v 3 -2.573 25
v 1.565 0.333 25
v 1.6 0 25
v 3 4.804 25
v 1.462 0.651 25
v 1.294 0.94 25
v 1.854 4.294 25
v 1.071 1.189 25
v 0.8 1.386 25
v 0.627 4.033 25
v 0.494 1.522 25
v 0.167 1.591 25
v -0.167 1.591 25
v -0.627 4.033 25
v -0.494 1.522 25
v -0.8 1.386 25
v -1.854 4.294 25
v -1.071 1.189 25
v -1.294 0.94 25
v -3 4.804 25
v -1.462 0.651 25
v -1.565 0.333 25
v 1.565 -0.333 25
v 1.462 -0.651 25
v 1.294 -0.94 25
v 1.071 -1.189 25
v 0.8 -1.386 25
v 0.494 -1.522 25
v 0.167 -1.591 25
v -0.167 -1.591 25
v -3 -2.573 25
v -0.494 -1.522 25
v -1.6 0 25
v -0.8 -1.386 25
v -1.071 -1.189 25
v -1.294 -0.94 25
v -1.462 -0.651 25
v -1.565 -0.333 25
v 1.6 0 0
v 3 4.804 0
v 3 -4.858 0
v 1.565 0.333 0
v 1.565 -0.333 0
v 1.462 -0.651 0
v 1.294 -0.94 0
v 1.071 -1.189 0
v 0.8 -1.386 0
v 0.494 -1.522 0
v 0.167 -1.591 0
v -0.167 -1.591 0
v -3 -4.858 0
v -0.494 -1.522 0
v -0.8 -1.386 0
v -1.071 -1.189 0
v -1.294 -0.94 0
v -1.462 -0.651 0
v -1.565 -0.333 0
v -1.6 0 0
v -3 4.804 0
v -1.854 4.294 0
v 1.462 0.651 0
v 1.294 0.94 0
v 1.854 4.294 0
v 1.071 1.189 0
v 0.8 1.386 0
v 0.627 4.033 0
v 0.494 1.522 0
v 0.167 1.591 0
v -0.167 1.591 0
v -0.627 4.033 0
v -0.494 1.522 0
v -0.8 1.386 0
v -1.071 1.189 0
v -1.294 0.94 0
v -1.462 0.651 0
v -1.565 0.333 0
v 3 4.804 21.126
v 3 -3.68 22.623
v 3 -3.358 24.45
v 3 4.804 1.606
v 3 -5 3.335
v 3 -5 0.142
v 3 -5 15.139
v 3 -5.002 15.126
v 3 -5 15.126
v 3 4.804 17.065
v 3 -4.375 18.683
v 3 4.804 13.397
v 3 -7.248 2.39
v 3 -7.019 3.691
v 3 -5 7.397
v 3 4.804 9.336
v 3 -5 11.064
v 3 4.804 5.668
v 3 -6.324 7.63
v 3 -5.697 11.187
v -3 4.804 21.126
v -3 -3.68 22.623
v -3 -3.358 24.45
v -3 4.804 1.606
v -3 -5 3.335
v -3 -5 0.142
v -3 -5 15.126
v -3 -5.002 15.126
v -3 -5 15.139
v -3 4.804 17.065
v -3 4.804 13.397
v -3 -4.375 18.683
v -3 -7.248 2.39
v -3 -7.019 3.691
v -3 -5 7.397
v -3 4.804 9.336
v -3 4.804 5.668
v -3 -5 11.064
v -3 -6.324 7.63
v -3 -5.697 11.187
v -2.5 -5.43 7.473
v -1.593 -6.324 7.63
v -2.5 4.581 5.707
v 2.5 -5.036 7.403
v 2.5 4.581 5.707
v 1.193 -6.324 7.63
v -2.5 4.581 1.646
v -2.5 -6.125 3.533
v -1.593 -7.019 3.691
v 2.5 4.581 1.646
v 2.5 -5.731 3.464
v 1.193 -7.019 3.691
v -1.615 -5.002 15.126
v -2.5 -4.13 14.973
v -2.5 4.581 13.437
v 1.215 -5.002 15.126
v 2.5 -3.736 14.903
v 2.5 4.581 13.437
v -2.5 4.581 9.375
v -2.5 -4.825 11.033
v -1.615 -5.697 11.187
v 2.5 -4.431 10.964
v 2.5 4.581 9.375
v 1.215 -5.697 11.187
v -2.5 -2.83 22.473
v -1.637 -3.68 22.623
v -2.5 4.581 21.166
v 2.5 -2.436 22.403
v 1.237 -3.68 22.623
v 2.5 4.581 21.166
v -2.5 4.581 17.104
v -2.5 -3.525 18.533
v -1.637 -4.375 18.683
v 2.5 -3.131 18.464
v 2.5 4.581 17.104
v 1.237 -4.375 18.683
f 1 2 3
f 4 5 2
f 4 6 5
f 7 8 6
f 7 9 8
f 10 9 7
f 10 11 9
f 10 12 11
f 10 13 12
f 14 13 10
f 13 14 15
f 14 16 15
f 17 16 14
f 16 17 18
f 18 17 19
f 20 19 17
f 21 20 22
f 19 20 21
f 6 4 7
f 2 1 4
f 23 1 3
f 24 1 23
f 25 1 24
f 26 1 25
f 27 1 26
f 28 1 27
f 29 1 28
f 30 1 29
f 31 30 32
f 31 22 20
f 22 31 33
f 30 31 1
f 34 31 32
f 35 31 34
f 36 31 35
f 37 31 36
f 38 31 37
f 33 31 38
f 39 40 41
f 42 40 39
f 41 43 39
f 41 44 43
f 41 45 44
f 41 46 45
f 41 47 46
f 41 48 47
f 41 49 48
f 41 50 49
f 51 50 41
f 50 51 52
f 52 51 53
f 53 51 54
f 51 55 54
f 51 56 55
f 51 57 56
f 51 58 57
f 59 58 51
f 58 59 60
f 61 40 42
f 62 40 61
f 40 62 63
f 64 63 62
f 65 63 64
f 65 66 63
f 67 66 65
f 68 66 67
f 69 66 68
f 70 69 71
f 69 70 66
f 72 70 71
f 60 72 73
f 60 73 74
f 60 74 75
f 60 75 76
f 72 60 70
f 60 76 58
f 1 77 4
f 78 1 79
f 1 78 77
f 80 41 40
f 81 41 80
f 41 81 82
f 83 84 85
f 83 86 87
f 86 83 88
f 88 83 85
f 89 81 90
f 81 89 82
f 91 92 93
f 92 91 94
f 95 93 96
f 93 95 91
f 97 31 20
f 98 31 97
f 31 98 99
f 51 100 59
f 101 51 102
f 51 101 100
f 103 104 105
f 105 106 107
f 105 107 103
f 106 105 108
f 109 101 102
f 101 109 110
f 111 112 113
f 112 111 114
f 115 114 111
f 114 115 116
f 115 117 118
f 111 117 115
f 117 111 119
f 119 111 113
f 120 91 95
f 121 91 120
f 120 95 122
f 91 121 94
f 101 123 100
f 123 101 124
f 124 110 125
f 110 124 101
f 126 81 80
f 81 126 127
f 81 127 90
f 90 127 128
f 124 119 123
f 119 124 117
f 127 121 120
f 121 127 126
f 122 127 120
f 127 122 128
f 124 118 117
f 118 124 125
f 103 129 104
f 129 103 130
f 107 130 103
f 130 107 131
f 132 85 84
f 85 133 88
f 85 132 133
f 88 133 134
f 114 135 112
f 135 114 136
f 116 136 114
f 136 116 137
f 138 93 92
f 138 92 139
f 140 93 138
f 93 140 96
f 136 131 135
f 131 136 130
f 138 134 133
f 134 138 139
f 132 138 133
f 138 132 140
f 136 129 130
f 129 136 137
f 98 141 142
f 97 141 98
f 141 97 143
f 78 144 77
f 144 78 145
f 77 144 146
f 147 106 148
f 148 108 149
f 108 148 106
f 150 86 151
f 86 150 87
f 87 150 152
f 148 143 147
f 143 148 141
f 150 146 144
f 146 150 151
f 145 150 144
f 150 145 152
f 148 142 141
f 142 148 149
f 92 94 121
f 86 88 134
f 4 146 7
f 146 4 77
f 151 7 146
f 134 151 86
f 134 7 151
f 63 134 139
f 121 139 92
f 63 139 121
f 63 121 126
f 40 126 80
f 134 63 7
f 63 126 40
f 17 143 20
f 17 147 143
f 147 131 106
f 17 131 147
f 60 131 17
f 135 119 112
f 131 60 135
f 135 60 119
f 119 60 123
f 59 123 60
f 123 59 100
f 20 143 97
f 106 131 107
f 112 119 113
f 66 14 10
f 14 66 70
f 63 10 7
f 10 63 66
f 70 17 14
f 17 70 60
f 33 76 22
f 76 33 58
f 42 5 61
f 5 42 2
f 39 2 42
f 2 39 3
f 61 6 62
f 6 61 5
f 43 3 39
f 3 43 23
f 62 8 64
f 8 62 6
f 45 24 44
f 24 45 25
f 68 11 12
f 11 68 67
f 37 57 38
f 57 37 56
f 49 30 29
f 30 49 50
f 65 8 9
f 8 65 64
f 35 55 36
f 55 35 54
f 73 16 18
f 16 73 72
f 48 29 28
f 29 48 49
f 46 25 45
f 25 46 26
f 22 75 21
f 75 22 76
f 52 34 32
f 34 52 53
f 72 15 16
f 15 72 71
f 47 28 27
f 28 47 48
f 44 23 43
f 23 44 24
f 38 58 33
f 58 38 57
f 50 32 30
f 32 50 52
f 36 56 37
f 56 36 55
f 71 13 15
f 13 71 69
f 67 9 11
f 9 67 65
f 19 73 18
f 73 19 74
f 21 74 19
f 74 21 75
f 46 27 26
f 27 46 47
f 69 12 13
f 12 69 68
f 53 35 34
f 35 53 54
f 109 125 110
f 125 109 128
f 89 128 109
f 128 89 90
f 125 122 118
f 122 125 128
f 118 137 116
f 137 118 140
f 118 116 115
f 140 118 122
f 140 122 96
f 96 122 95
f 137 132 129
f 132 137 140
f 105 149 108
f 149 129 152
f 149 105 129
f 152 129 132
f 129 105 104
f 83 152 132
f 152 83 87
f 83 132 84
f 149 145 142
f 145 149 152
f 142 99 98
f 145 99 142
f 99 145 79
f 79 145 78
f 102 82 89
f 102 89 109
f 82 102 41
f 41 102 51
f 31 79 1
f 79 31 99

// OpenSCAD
module zip() {
  translate([-5,-8,0]) cube([10,4,4]);
  translate([-12.5,-5,0]) cube([10,20.0,4]);
  translate([2.5,-5,0]) cube([10,20.0,4]);
  translate([2,-6,0]) rotate([0,0,45]) cube([5,2,4]);
  translate([-6,-2.4,0]) rotate([0,0,-45]) cube([5,2,4]);
}

difference(){
    union(){
      translate([0,5,0]) cylinder(r=10, h=25, $fn=30);
      translate([-3,-9,0]) cube([6,10,25]);
    }
    
    translate([0,10,-1]) cylinder(r=6, h=50, $fn=30);
    translate([0,0,-1]) cylinder(r=1.6, h=50, $fn=30);
    translate([3,-5,-1]) cube([10,20.0,50]);
    translate([-13,-5,-1]) cube([10,20.0,50]);
    
    translate([-10,-18,-1]) rotate([-10,0,0]) cube([20,10,50]);
    
    translate([0,-3.1,3]) rotate([-10,0,0]) zip();
    translate([0,-1.8,10.5]) rotate([-10,0,0]) zip();
    translate([0,-0.5,18]) rotate([-10,0,0]) zip();

    translate([-13,-9,-10]) rotate([45,0,0]) cube([30,10.0,10]);
    translate([-13,-9,20.5]) rotate([35,0,0]) cube([30,10.0,10]);
}
